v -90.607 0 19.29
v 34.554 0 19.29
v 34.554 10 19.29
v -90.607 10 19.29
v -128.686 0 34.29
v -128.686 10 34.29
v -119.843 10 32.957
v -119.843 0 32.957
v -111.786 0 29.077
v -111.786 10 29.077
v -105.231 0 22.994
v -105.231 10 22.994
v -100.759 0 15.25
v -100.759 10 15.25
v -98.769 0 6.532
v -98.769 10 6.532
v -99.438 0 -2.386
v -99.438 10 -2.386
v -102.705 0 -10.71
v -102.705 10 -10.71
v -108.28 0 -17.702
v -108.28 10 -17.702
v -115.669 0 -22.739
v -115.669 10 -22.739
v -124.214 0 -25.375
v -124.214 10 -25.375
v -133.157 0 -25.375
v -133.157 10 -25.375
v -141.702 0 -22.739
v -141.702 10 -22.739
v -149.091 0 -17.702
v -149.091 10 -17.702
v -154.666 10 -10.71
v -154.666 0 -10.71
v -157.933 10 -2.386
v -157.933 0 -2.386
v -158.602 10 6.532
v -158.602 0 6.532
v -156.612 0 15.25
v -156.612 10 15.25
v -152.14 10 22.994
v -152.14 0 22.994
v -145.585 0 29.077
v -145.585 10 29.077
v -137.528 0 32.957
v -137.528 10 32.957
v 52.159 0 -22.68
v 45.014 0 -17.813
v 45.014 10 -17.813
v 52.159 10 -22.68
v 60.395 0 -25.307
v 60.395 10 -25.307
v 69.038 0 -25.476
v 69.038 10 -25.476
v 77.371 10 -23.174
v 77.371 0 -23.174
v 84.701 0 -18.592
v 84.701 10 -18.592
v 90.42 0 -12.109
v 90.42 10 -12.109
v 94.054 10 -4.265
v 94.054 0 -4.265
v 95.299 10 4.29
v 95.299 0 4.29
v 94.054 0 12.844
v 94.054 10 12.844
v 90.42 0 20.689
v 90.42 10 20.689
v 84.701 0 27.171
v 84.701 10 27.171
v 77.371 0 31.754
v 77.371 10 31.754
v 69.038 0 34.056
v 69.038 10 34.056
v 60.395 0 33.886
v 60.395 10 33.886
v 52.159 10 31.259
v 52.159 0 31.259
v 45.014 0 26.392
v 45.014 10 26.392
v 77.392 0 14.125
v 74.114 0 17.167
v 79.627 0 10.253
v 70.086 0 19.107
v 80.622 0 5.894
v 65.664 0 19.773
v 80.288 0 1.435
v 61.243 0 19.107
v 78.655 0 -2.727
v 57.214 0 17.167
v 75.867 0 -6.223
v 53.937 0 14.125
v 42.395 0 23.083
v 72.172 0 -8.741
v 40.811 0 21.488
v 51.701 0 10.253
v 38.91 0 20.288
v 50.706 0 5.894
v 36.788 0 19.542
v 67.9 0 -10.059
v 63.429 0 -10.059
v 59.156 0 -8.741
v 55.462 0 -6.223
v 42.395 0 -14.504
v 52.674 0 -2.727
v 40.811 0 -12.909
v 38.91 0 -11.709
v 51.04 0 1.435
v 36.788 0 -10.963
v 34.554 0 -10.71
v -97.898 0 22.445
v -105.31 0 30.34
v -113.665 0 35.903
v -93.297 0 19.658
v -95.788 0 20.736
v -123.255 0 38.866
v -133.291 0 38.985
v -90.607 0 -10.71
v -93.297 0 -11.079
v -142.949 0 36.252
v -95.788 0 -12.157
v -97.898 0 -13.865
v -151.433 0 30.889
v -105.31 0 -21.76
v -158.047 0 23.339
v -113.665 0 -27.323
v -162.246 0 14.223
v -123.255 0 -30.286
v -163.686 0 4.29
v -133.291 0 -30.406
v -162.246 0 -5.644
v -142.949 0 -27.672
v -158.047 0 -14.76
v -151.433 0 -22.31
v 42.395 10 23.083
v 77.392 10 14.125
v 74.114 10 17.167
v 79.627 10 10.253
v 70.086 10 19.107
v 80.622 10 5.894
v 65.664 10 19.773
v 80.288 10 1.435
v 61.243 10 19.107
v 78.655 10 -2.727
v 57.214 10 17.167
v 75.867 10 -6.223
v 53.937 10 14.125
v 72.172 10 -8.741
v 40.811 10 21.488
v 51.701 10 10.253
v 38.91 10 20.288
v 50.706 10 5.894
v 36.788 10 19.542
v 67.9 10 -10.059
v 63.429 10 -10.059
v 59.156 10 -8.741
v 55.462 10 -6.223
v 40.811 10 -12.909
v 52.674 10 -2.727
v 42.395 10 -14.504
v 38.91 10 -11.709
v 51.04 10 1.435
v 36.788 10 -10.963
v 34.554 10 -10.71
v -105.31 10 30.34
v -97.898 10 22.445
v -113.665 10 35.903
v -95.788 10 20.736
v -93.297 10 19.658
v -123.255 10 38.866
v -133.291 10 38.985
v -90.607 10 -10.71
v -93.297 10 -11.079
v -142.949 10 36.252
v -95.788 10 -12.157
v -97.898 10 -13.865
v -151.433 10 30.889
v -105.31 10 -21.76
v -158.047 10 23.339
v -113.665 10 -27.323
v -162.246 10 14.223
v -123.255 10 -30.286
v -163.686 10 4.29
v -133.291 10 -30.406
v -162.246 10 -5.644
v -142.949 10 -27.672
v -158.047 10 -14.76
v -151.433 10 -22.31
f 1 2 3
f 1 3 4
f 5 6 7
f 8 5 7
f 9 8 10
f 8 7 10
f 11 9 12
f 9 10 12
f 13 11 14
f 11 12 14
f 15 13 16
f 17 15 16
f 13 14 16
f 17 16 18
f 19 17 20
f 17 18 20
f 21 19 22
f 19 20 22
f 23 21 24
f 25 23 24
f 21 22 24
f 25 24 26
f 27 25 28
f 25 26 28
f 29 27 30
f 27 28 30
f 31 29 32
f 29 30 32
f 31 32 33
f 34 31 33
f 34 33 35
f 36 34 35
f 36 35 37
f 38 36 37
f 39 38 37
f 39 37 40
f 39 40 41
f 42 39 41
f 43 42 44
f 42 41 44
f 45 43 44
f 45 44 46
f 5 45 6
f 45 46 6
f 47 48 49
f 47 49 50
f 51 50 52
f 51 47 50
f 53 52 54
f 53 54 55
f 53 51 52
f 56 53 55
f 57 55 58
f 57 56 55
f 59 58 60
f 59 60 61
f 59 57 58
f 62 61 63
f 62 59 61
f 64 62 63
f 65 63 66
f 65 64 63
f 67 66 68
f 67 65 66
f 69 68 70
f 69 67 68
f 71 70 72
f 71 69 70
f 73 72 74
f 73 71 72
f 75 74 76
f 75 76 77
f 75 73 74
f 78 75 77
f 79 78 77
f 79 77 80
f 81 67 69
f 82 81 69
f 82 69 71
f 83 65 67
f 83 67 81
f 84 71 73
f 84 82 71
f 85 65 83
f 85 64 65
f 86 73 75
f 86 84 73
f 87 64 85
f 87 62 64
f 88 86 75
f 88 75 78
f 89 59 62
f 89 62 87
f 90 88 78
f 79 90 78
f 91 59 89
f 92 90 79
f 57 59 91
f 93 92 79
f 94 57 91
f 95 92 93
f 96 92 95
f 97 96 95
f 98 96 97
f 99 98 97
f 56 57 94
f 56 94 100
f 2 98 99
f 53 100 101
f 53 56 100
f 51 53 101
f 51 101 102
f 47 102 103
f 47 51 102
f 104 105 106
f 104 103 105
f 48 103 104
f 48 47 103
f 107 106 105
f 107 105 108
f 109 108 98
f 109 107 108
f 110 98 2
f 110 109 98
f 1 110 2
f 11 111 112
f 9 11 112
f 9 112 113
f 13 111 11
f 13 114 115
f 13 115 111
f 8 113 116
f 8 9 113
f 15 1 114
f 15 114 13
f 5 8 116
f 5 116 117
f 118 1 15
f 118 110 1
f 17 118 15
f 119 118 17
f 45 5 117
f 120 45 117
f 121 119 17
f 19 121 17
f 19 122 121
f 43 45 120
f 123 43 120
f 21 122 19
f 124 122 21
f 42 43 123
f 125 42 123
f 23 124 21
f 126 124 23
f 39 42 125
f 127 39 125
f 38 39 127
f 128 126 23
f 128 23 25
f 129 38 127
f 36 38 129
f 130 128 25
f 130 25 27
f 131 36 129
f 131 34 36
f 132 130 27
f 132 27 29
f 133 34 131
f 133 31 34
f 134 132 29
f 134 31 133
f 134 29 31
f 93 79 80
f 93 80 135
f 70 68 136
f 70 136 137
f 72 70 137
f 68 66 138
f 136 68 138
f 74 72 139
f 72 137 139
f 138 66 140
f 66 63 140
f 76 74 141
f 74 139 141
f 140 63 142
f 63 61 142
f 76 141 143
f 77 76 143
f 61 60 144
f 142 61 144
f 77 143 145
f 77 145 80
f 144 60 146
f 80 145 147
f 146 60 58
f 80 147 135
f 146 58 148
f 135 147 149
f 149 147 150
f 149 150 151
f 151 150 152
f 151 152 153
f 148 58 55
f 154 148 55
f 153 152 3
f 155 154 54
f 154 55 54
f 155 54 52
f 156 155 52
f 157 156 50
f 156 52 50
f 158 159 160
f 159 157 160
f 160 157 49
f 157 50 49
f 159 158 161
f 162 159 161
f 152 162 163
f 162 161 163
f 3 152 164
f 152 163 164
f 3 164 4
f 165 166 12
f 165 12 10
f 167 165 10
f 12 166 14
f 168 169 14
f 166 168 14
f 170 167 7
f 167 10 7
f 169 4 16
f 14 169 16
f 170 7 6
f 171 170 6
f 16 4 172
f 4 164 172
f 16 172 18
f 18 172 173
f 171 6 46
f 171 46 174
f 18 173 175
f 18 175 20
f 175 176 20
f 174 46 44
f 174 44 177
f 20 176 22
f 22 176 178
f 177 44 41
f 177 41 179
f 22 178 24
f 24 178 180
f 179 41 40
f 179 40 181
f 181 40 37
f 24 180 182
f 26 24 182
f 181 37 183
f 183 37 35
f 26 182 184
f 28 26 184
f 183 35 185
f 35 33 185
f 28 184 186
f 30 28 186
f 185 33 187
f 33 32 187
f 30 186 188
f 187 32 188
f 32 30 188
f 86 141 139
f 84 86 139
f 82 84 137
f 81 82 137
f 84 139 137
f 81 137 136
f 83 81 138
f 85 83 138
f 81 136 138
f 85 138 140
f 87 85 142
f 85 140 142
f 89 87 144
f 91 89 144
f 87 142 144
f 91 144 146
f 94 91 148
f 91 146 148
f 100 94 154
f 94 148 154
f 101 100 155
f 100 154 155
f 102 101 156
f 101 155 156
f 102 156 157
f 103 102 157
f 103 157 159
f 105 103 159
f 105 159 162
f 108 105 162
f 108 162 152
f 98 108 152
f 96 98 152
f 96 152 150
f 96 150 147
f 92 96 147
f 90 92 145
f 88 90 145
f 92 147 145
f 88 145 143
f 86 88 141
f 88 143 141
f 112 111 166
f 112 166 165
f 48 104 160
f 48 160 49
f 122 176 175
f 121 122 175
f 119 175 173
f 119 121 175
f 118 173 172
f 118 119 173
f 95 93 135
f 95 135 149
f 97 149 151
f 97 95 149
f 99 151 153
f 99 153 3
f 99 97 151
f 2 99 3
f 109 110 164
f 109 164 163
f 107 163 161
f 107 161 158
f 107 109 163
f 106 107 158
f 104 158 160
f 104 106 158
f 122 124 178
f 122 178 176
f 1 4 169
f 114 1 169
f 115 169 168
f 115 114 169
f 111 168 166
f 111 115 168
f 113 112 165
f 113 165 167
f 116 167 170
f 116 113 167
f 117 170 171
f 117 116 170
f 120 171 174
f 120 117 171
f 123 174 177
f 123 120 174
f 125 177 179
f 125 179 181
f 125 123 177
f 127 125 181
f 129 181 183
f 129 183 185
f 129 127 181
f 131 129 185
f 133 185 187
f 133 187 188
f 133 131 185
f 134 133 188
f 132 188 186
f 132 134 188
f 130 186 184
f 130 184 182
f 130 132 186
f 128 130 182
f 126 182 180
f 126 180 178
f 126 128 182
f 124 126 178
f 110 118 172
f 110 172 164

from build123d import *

# Parameters (mm, degrees)
SKETCH1_R           = 0.605786837
BOSS_EXTRUDE1_DEPTH = 10
SKETCH3_R           = 30
SKETCH3_R_2         = 15
CUT_EXTRUDE1_DEPTH  = 10


with BuildPart() as part:
    # Sketch1 → Boss-Extrude1 (new body)
    with BuildSketch(Plane(origin=(0, 0, 0), x_dir=(1, 0, 0), z_dir=(0, 1, 0))):
        with BuildLine():
            Line((42.395388783, 14.504200511), (45.014187909, 17.812893064))
            ThreePointArc((45.014187909, 17.812893064), (95.299132477, -4.289618646), (45.014187909, -26.392130356))
            Line((45.014187909, -26.392130356), (42.395388783, -23.083437803))
            ThreePointArc((42.395388783, -23.083437803), (38.909611349, -20.287901909), (34.554258804, -19.289618646))
            Line((34.554258804, -19.289618646), (-90.607383501, -19.289618646))
            ThreePointArc((-90.607383501, -19.289618646), (-94.579180908, -20.112210224), (-97.897544897, -22.444653576))
            Line((-97.897544897, -22.444653576), (-105.310368622, -30.339607137))
            ThreePointArc((-105.310368622, -30.339607137), (-163.685528507, -4.289618646), (-105.310368622, 21.760369845))
            Line((-105.310368622, 21.760369845), (-97.897544897, 13.865416283))
            ThreePointArc((-97.897544897, 13.865416283), (-94.579180908, 11.532972931), (-90.607383501, 10.710381354))
            Line((-90.607383501, 10.710381354), (34.554258804, 10.710381354))
            ThreePointArc((34.554258804, 10.710381354), (38.909611349, 11.708664617), (42.395388783, 14.504200511))
        make_face()
        with Locations(Location((65.299132477, -4.289618646, 0), (0, 0, 270))):
            Circle(SKETCH1_R, mode=Mode.SUBTRACT)
    extrude(amount=BOSS_EXTRUDE1_DEPTH)

    # Sketch3 → Cut-Extrude1 (cut)
    with BuildSketch(Plane(origin=(0, 10, 0), x_dir=(1, 0, 0), z_dir=(0, 1, 0))):
        with Locations(Location((-128.685528507, -4.289618646, 0), (0, 0, 270))):
            Circle(SKETCH3_R)
        with Locations(Location((65.664200703, -4.773046906, 0), (0, 0, 270))):
            Circle(SKETCH3_R_2)
    extrude(amount=-CUT_EXTRUDE1_DEPTH, mode=Mode.SUBTRACT)


solid = part.part
